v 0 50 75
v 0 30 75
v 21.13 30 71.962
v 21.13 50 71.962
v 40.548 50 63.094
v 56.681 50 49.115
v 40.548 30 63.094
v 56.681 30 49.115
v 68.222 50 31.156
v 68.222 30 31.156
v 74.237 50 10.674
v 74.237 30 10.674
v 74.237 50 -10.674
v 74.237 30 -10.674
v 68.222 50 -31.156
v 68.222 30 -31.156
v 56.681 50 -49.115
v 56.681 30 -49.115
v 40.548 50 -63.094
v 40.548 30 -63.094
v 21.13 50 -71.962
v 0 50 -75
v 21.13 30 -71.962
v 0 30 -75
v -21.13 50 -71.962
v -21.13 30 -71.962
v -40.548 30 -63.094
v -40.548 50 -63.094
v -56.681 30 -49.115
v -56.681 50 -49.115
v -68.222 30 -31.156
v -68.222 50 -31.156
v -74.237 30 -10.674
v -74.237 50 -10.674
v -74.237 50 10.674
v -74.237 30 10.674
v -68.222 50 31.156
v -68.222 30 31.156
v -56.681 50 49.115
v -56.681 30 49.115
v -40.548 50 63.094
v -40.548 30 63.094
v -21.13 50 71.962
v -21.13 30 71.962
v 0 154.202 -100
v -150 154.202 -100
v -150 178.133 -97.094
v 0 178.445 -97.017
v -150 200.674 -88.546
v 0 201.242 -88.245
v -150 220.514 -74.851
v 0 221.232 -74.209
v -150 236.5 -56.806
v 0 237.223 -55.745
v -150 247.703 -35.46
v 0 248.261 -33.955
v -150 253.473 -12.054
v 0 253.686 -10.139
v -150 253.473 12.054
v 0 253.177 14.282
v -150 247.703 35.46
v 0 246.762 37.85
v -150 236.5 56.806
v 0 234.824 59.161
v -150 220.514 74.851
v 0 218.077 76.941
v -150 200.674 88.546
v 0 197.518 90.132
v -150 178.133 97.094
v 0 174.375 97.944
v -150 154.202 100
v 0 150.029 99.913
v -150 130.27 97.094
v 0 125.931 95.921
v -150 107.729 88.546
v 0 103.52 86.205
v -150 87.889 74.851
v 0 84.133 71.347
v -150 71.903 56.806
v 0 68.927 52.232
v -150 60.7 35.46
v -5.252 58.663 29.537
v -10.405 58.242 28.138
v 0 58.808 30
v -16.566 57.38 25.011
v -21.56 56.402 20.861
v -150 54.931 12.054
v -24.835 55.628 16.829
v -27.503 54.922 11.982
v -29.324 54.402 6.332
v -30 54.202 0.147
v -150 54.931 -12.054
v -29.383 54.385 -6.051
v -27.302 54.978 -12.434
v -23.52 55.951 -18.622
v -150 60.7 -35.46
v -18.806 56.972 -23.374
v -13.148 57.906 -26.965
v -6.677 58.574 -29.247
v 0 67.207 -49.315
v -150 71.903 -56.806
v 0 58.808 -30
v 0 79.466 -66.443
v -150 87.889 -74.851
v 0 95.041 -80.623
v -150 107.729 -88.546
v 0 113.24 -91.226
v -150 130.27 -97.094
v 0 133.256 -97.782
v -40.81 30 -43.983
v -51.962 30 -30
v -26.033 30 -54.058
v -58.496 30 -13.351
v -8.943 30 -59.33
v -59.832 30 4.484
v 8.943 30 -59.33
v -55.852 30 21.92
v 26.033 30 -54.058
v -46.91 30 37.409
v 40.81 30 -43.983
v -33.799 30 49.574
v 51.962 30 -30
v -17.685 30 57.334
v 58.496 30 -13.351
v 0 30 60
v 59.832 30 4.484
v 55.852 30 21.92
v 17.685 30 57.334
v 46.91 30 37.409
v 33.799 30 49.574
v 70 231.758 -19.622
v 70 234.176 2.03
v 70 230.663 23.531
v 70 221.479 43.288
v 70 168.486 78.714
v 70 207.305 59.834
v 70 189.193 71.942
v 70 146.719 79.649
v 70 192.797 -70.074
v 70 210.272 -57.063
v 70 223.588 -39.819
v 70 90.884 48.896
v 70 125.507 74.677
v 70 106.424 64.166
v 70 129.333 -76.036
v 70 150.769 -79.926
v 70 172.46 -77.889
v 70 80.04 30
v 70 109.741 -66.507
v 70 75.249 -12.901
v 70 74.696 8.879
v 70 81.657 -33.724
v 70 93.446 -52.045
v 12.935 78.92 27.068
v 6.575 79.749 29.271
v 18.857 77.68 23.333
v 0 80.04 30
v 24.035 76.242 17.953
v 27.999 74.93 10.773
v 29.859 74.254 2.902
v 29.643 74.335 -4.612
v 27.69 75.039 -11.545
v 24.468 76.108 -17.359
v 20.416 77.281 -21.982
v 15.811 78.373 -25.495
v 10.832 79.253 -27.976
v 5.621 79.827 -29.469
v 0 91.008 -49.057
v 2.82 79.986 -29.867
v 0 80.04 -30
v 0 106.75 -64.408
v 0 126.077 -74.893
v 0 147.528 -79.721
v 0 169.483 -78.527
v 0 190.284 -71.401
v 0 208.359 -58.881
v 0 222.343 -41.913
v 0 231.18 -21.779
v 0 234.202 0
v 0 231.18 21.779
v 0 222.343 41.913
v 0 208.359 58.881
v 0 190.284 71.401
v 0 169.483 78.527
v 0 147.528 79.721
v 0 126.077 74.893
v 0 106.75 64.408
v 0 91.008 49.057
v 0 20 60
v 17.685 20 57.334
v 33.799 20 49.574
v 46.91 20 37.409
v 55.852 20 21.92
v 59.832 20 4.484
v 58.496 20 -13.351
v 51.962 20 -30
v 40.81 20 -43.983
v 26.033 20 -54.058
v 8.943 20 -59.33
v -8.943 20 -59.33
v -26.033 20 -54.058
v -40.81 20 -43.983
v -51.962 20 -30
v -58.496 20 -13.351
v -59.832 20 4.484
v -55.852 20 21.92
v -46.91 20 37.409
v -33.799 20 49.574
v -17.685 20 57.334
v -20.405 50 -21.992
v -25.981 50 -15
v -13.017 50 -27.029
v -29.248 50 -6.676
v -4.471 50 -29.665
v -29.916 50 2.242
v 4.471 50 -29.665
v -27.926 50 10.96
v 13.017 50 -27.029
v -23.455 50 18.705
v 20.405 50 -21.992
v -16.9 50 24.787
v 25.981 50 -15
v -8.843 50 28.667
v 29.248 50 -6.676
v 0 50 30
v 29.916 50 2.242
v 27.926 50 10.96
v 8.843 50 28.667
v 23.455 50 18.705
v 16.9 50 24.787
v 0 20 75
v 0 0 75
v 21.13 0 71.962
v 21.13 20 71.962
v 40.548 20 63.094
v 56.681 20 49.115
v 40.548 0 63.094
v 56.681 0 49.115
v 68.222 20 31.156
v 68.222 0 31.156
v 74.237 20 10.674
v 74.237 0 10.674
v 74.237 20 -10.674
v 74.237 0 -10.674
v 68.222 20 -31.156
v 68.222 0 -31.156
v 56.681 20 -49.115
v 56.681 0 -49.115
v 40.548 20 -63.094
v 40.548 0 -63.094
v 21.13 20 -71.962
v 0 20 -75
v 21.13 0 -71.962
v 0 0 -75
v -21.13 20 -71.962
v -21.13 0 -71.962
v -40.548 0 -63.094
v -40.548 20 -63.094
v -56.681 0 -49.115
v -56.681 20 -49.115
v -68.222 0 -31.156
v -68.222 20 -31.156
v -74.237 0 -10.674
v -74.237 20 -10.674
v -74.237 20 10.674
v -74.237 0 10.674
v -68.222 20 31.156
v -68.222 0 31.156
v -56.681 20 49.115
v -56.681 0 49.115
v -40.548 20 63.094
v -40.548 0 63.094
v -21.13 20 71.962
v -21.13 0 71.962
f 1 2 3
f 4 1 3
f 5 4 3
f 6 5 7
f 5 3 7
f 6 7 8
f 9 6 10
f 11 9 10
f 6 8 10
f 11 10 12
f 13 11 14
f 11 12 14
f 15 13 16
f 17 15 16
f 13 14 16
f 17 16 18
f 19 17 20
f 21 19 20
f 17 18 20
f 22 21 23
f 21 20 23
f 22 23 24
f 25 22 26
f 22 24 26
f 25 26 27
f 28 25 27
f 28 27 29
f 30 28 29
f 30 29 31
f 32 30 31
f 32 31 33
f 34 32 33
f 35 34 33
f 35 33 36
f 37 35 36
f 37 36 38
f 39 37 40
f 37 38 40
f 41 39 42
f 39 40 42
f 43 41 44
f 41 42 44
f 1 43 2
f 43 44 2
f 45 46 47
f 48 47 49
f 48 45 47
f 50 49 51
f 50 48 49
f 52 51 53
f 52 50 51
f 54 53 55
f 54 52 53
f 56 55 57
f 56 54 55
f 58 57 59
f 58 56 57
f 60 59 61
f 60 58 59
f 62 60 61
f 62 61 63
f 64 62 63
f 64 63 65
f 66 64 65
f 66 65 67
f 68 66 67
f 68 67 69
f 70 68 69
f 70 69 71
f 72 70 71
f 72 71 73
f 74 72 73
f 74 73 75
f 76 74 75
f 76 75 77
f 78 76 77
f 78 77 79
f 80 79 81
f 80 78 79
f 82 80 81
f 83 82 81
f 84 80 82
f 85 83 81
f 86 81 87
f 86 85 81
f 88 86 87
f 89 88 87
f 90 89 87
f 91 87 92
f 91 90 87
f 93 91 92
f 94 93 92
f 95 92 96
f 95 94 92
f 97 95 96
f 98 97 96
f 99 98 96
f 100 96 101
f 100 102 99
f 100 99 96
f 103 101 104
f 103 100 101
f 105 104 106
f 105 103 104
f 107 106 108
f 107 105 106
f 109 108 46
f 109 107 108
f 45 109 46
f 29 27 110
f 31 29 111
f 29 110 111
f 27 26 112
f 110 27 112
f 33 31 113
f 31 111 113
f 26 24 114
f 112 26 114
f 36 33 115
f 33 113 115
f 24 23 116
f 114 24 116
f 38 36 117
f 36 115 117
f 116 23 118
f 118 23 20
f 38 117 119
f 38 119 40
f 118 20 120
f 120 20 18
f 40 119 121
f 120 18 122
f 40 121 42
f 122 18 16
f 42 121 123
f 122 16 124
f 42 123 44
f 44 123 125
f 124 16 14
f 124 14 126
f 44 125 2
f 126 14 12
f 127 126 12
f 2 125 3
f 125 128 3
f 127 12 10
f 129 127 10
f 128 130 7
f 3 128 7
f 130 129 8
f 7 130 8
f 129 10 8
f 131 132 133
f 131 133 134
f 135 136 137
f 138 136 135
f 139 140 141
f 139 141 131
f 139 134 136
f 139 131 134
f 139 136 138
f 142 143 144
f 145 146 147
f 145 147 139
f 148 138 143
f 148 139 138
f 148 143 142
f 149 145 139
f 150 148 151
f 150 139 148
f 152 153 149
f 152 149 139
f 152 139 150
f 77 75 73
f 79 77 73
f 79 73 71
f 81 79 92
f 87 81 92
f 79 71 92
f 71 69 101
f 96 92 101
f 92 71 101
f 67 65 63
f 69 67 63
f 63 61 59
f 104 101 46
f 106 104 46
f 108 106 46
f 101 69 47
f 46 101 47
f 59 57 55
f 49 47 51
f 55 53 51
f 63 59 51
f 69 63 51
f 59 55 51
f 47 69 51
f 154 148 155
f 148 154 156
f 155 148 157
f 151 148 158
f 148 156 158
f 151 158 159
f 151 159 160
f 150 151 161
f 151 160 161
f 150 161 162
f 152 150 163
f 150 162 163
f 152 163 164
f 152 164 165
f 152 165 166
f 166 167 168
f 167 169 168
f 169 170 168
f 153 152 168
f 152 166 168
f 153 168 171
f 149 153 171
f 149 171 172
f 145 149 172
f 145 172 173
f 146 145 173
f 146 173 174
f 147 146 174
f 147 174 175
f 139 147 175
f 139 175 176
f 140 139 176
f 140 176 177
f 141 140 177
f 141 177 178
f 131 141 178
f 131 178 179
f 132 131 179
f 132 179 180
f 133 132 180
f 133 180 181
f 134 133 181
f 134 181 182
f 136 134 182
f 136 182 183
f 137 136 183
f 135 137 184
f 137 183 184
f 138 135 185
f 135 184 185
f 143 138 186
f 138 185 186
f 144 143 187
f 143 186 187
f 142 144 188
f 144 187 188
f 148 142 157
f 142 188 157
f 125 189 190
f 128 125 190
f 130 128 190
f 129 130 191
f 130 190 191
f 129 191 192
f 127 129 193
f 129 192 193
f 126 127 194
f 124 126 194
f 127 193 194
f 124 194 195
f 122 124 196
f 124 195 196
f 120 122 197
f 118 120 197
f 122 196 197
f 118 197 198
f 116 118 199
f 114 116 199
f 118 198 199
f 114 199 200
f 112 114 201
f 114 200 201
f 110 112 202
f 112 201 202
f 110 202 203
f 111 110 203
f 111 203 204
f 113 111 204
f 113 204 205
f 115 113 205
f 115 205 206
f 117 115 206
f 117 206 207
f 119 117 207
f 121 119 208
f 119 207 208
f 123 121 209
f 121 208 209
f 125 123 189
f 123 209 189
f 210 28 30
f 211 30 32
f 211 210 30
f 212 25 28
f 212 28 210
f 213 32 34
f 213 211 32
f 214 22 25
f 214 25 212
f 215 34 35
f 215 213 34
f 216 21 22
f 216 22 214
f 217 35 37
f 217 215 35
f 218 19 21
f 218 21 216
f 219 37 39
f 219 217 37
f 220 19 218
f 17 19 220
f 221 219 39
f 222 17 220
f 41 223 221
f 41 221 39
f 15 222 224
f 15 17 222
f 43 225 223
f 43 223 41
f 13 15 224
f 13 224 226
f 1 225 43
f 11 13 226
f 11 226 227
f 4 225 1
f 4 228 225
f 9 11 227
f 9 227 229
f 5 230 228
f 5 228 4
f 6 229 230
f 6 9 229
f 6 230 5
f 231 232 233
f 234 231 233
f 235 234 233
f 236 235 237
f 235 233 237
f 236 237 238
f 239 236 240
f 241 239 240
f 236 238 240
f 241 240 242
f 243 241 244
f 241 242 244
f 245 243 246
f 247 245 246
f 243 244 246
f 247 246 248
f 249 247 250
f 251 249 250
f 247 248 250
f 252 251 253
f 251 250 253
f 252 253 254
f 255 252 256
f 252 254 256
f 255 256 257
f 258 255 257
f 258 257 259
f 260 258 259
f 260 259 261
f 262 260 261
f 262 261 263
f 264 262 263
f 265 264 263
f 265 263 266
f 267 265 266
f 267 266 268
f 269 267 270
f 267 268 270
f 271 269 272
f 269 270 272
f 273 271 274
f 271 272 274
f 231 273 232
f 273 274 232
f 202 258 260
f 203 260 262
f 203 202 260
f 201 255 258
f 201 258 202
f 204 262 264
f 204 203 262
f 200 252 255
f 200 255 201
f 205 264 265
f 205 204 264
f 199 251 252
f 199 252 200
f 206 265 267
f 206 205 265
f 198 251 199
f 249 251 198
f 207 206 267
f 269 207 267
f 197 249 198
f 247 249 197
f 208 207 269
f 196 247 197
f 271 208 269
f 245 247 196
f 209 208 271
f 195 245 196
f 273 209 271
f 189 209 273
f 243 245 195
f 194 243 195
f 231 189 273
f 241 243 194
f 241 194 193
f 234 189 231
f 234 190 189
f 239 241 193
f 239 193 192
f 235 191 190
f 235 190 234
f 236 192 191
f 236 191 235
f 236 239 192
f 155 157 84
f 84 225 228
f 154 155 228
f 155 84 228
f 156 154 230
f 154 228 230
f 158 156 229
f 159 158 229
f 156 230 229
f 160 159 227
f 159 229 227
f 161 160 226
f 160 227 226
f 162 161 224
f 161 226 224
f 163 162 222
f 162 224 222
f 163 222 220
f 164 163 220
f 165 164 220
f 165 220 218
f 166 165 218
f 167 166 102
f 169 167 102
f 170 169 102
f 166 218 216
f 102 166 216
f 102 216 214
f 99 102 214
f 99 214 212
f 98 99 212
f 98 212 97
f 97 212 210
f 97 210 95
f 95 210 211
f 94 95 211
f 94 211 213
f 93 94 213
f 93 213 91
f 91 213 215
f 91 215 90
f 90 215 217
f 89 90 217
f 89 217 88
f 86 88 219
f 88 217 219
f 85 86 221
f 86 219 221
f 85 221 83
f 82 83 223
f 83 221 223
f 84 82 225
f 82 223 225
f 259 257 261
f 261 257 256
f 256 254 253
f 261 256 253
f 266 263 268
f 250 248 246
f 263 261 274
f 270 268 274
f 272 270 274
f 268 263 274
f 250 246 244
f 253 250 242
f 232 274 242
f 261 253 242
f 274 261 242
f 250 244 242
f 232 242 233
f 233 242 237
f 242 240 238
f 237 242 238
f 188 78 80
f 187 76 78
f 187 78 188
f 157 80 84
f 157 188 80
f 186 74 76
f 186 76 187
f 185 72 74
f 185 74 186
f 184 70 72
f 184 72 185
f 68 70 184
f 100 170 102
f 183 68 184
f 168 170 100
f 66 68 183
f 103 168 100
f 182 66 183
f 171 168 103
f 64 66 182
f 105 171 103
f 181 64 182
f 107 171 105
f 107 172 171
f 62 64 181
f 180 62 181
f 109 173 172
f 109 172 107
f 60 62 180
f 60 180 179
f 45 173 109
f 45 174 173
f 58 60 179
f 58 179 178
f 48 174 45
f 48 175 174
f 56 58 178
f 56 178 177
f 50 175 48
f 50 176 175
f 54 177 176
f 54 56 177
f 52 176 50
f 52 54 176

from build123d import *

# Parameters (mm, degrees)
SKETCH1_R           = 75
BOSS_EXTRUDE1_DEPTH = 20
SKETCH2_R           = 60
BOSS_EXTRUDE2_DEPTH = 10
SKETCH3_R           = 75
BOSS_EXTRUDE3_DEPTH = 20
SKETCH4_R           = 30
BOSS_EXTRUDE4_DEPTH = 100
SKETCH5_R           = 100
BOSS_EXTRUDE5_DEPTH = 150
SKETCH6_R           = 80
BOSS_EXTRUDE6_DEPTH = 70


with BuildPart() as part:
    # Sketch1 → Boss-Extrude1 (new body)
    with BuildSketch(Plane(origin=(0, 0, 0), x_dir=(1, 0, 0), z_dir=(0, 1, 0))):
        with Locations(Location((0, 0, 0), (0, 0, 270))):
            Circle(SKETCH1_R)
    extrude(amount=BOSS_EXTRUDE1_DEPTH)

    # Sketch2 → Boss-Extrude2 (add)
    with BuildSketch(Plane(origin=(0, 20, 0), x_dir=(1, 0, 0), z_dir=(0, 1, 0))):
        with Locations(Location((0, 0, 0), (0, 0, 270))):
            Circle(SKETCH2_R)
    extrude(amount=BOSS_EXTRUDE2_DEPTH)

    # Sketch3 → Boss-Extrude3 (add)
    with BuildSketch(Plane(origin=(0, 30, 0), x_dir=(1, 0, 0), z_dir=(0, 1, 0))):
        with Locations(Location((0, 0, 0), (0, 0, 270))):
            Circle(SKETCH3_R)
    extrude(amount=BOSS_EXTRUDE3_DEPTH)

    # Sketch4 → Boss-Extrude4 (add)
    with BuildSketch(Plane(origin=(0, 50, 0), x_dir=(1, 0, 0), z_dir=(0, 1, 0))):
        with Locations(Location((0, 0, 0), (0, 0, 270))):
            Circle(SKETCH4_R)
    extrude(amount=BOSS_EXTRUDE4_DEPTH)

    # Sketch5 → Boss-Extrude5 (add)
    with BuildSketch(Plane(origin=(0, 0, 0), x_dir=(0, 0, -1), z_dir=(1, 0, 0))):
        with Locations((0, 154.201763101)):
            Circle(SKETCH5_R)
    extrude(amount=-BOSS_EXTRUDE5_DEPTH)

    # Sketch6 → Boss-Extrude6 (add)
    with BuildSketch(Plane(origin=(0, 0, 0), x_dir=(0, 0, -1), z_dir=(1, 0, 0))):
        with Locations(Location((0, 154.201763101, 0), (0, 0, 247.975687163))):
            Circle(SKETCH6_R)
    extrude(amount=BOSS_EXTRUDE6_DEPTH)


solid = part.part
